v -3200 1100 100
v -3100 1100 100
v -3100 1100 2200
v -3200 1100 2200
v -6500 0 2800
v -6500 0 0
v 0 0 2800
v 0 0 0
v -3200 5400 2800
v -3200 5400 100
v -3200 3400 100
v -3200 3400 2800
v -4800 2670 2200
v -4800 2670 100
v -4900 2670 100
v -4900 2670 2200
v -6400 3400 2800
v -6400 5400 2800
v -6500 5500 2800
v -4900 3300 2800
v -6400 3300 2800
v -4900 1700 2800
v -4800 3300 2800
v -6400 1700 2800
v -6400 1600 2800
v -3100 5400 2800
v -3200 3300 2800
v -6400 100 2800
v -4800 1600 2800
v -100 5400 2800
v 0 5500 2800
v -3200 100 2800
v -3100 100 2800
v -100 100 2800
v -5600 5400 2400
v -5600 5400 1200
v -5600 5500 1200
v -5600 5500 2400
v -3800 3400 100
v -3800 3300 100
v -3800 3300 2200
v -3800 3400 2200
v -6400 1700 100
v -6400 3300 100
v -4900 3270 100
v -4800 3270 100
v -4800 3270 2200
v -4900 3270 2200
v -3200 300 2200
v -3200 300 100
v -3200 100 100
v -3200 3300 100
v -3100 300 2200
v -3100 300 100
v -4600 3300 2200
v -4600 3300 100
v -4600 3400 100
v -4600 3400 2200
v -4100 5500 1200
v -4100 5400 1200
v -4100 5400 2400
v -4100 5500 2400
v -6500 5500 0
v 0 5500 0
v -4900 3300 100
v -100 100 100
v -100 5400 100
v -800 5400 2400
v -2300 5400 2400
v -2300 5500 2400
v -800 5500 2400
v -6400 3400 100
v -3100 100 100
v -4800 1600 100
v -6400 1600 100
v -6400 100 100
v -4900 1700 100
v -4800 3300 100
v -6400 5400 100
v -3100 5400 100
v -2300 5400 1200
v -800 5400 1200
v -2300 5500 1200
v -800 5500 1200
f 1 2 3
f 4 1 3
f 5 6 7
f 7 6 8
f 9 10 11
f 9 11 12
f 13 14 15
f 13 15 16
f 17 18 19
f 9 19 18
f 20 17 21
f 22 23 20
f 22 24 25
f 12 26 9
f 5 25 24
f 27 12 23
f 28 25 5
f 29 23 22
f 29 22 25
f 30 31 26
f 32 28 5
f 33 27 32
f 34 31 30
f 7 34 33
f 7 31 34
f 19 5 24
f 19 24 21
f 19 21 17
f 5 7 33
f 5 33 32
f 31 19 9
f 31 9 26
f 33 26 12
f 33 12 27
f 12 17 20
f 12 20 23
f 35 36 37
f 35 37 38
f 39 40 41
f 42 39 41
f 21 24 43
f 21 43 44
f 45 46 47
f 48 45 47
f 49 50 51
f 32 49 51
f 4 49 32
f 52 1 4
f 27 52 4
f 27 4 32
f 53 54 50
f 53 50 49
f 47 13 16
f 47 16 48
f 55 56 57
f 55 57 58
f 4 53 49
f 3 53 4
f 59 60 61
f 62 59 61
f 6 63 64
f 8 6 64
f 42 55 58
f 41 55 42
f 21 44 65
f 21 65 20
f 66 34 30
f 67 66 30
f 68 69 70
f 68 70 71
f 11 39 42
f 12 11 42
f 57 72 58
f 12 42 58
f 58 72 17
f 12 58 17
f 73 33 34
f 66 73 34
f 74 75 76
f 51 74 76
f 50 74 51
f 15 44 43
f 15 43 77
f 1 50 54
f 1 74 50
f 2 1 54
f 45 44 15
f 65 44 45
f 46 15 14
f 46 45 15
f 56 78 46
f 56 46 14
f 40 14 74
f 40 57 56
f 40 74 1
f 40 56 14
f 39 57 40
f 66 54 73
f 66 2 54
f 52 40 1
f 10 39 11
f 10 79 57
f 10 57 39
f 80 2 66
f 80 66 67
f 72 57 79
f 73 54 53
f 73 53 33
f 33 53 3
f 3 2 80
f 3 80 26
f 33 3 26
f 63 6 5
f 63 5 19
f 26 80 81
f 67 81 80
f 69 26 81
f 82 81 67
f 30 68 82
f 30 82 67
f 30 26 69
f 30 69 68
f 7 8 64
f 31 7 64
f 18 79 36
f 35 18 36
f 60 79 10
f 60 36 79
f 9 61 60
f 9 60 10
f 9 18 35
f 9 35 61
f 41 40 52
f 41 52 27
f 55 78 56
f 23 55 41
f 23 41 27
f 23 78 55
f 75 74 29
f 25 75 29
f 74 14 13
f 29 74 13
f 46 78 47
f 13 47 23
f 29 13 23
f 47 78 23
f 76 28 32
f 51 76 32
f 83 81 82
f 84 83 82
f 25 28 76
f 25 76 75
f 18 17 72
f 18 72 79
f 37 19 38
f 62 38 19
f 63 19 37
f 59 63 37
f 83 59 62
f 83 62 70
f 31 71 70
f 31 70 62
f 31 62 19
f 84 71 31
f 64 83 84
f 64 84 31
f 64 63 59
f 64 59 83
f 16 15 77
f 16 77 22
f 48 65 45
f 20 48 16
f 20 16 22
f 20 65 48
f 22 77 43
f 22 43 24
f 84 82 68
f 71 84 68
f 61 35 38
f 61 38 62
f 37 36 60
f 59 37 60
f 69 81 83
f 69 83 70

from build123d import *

# Parameters (mm, degrees)
F0_W      = 6500
F0_H      = 5500
F1_DEPTH  = 2800
F2_W      = 6300
F2_H      = 5300
F3_DEPTH  = 2700
F4_W      = 100
F4_H      = 2700
F5_DEPTH  = 5300
F6_W      = 800
F6_H      = 2100
F7_DEPTH  = 100
F8_W      = 100
F8_H      = 2700
F9_DEPTH  = 3200
F10_W     = 800
F10_H     = 2100
F11_DEPTH = 100
F12_W     = 100
F12_H     = 2700
F13_DEPTH = 1700
F14_W     = 100
F14_H     = 2700
F15_DEPTH = 1500
F16_W     = 1500
F16_H     = 1200
F17_DEPTH = 100
F18_W     = 1500
F18_H     = 1200
F19_DEPTH = 100
F20_W     = 600
F20_H     = 2100
F21_DEPTH = 100


with BuildPart() as f1:
    # F0 (on Top) → F1 (new body)
    with BuildSketch(Plane.XY):
        with Locations((-3250, 2750)):
            Rectangle(F0_W, F0_H)
    extrude(amount=F1_DEPTH)

    # F2 (on face) → F3 (cut)
    with BuildSketch(Plane.XY.offset(2800)):
        with Locations((-3250, 2750)):
            Rectangle(F2_W, F2_H)
    extrude(amount=-F3_DEPTH, mode=Mode.SUBTRACT)

    # F4 (on face) → F5 (join, through all)
    with BuildSketch(Plane.XZ.offset(-5400)):
        with Locations((-3150, 1450)):
            Rectangle(F4_W, F4_H)
    extrude(amount=F5_DEPTH)

    # F6 (on face) → F7 (cut, through all)
    with BuildSketch(Plane.YZ.offset(-3100)):
        with Locations((700, 1150)):
            Rectangle(F6_W, F6_H)
    extrude(amount=-F7_DEPTH, mode=Mode.SUBTRACT)

    # F8 (on face) → F9 (join, through all)
    with BuildSketch(Plane.YZ.offset(-6400)):
        with Locations((3350, 1450)):
            Rectangle(F8_W, F8_H)
    extrude(amount=F9_DEPTH)

    # F10 (on face) → F11 (cut, through all)
    with BuildSketch(Plane.XZ.offset(-3300)):
        with Locations((-4200, 1150)):
            Rectangle(F10_W, F10_H)
    extrude(amount=-F11_DEPTH, mode=Mode.SUBTRACT)

    # F12 (on face) → F13 (join)
    with BuildSketch(Plane.XZ.offset(-3300)):
        with Locations((-4850, 1450)):
            Rectangle(F12_W, F12_H)
    extrude(amount=F13_DEPTH)

    # F14 (on face) → F15 (join, through all)
    with BuildSketch(Plane(origin=(-4900, 0, 0), x_dir=(0, -1, 0), z_dir=(-1, 0, 0))):
        with Locations((-1650, 1450)):
            Rectangle(F14_W, F14_H)
    extrude(amount=F15_DEPTH)

    # F16 (on face) → F17 (cut, through all)
    with BuildSketch(Plane.XZ.offset(-5400)):
        with Locations((-1550, 1800)):
            Rectangle(F16_W, F16_H)
    extrude(amount=-F17_DEPTH, mode=Mode.SUBTRACT)

    # F18 (on face) → F19 (cut, through all)
    with BuildSketch(Plane.XZ.offset(-5400)):
        with Locations((-4850, 1800)):
            Rectangle(F18_W, F18_H)
    extrude(amount=-F19_DEPTH, mode=Mode.SUBTRACT)

    # F20 (on face) → F21 (cut, through all)
    with BuildSketch(Plane.YZ.offset(-4800)):
        with Locations((2970, 1150)):
            Rectangle(F20_W, F20_H)
    extrude(amount=-F21_DEPTH, mode=Mode.SUBTRACT)


solid = f1.part
